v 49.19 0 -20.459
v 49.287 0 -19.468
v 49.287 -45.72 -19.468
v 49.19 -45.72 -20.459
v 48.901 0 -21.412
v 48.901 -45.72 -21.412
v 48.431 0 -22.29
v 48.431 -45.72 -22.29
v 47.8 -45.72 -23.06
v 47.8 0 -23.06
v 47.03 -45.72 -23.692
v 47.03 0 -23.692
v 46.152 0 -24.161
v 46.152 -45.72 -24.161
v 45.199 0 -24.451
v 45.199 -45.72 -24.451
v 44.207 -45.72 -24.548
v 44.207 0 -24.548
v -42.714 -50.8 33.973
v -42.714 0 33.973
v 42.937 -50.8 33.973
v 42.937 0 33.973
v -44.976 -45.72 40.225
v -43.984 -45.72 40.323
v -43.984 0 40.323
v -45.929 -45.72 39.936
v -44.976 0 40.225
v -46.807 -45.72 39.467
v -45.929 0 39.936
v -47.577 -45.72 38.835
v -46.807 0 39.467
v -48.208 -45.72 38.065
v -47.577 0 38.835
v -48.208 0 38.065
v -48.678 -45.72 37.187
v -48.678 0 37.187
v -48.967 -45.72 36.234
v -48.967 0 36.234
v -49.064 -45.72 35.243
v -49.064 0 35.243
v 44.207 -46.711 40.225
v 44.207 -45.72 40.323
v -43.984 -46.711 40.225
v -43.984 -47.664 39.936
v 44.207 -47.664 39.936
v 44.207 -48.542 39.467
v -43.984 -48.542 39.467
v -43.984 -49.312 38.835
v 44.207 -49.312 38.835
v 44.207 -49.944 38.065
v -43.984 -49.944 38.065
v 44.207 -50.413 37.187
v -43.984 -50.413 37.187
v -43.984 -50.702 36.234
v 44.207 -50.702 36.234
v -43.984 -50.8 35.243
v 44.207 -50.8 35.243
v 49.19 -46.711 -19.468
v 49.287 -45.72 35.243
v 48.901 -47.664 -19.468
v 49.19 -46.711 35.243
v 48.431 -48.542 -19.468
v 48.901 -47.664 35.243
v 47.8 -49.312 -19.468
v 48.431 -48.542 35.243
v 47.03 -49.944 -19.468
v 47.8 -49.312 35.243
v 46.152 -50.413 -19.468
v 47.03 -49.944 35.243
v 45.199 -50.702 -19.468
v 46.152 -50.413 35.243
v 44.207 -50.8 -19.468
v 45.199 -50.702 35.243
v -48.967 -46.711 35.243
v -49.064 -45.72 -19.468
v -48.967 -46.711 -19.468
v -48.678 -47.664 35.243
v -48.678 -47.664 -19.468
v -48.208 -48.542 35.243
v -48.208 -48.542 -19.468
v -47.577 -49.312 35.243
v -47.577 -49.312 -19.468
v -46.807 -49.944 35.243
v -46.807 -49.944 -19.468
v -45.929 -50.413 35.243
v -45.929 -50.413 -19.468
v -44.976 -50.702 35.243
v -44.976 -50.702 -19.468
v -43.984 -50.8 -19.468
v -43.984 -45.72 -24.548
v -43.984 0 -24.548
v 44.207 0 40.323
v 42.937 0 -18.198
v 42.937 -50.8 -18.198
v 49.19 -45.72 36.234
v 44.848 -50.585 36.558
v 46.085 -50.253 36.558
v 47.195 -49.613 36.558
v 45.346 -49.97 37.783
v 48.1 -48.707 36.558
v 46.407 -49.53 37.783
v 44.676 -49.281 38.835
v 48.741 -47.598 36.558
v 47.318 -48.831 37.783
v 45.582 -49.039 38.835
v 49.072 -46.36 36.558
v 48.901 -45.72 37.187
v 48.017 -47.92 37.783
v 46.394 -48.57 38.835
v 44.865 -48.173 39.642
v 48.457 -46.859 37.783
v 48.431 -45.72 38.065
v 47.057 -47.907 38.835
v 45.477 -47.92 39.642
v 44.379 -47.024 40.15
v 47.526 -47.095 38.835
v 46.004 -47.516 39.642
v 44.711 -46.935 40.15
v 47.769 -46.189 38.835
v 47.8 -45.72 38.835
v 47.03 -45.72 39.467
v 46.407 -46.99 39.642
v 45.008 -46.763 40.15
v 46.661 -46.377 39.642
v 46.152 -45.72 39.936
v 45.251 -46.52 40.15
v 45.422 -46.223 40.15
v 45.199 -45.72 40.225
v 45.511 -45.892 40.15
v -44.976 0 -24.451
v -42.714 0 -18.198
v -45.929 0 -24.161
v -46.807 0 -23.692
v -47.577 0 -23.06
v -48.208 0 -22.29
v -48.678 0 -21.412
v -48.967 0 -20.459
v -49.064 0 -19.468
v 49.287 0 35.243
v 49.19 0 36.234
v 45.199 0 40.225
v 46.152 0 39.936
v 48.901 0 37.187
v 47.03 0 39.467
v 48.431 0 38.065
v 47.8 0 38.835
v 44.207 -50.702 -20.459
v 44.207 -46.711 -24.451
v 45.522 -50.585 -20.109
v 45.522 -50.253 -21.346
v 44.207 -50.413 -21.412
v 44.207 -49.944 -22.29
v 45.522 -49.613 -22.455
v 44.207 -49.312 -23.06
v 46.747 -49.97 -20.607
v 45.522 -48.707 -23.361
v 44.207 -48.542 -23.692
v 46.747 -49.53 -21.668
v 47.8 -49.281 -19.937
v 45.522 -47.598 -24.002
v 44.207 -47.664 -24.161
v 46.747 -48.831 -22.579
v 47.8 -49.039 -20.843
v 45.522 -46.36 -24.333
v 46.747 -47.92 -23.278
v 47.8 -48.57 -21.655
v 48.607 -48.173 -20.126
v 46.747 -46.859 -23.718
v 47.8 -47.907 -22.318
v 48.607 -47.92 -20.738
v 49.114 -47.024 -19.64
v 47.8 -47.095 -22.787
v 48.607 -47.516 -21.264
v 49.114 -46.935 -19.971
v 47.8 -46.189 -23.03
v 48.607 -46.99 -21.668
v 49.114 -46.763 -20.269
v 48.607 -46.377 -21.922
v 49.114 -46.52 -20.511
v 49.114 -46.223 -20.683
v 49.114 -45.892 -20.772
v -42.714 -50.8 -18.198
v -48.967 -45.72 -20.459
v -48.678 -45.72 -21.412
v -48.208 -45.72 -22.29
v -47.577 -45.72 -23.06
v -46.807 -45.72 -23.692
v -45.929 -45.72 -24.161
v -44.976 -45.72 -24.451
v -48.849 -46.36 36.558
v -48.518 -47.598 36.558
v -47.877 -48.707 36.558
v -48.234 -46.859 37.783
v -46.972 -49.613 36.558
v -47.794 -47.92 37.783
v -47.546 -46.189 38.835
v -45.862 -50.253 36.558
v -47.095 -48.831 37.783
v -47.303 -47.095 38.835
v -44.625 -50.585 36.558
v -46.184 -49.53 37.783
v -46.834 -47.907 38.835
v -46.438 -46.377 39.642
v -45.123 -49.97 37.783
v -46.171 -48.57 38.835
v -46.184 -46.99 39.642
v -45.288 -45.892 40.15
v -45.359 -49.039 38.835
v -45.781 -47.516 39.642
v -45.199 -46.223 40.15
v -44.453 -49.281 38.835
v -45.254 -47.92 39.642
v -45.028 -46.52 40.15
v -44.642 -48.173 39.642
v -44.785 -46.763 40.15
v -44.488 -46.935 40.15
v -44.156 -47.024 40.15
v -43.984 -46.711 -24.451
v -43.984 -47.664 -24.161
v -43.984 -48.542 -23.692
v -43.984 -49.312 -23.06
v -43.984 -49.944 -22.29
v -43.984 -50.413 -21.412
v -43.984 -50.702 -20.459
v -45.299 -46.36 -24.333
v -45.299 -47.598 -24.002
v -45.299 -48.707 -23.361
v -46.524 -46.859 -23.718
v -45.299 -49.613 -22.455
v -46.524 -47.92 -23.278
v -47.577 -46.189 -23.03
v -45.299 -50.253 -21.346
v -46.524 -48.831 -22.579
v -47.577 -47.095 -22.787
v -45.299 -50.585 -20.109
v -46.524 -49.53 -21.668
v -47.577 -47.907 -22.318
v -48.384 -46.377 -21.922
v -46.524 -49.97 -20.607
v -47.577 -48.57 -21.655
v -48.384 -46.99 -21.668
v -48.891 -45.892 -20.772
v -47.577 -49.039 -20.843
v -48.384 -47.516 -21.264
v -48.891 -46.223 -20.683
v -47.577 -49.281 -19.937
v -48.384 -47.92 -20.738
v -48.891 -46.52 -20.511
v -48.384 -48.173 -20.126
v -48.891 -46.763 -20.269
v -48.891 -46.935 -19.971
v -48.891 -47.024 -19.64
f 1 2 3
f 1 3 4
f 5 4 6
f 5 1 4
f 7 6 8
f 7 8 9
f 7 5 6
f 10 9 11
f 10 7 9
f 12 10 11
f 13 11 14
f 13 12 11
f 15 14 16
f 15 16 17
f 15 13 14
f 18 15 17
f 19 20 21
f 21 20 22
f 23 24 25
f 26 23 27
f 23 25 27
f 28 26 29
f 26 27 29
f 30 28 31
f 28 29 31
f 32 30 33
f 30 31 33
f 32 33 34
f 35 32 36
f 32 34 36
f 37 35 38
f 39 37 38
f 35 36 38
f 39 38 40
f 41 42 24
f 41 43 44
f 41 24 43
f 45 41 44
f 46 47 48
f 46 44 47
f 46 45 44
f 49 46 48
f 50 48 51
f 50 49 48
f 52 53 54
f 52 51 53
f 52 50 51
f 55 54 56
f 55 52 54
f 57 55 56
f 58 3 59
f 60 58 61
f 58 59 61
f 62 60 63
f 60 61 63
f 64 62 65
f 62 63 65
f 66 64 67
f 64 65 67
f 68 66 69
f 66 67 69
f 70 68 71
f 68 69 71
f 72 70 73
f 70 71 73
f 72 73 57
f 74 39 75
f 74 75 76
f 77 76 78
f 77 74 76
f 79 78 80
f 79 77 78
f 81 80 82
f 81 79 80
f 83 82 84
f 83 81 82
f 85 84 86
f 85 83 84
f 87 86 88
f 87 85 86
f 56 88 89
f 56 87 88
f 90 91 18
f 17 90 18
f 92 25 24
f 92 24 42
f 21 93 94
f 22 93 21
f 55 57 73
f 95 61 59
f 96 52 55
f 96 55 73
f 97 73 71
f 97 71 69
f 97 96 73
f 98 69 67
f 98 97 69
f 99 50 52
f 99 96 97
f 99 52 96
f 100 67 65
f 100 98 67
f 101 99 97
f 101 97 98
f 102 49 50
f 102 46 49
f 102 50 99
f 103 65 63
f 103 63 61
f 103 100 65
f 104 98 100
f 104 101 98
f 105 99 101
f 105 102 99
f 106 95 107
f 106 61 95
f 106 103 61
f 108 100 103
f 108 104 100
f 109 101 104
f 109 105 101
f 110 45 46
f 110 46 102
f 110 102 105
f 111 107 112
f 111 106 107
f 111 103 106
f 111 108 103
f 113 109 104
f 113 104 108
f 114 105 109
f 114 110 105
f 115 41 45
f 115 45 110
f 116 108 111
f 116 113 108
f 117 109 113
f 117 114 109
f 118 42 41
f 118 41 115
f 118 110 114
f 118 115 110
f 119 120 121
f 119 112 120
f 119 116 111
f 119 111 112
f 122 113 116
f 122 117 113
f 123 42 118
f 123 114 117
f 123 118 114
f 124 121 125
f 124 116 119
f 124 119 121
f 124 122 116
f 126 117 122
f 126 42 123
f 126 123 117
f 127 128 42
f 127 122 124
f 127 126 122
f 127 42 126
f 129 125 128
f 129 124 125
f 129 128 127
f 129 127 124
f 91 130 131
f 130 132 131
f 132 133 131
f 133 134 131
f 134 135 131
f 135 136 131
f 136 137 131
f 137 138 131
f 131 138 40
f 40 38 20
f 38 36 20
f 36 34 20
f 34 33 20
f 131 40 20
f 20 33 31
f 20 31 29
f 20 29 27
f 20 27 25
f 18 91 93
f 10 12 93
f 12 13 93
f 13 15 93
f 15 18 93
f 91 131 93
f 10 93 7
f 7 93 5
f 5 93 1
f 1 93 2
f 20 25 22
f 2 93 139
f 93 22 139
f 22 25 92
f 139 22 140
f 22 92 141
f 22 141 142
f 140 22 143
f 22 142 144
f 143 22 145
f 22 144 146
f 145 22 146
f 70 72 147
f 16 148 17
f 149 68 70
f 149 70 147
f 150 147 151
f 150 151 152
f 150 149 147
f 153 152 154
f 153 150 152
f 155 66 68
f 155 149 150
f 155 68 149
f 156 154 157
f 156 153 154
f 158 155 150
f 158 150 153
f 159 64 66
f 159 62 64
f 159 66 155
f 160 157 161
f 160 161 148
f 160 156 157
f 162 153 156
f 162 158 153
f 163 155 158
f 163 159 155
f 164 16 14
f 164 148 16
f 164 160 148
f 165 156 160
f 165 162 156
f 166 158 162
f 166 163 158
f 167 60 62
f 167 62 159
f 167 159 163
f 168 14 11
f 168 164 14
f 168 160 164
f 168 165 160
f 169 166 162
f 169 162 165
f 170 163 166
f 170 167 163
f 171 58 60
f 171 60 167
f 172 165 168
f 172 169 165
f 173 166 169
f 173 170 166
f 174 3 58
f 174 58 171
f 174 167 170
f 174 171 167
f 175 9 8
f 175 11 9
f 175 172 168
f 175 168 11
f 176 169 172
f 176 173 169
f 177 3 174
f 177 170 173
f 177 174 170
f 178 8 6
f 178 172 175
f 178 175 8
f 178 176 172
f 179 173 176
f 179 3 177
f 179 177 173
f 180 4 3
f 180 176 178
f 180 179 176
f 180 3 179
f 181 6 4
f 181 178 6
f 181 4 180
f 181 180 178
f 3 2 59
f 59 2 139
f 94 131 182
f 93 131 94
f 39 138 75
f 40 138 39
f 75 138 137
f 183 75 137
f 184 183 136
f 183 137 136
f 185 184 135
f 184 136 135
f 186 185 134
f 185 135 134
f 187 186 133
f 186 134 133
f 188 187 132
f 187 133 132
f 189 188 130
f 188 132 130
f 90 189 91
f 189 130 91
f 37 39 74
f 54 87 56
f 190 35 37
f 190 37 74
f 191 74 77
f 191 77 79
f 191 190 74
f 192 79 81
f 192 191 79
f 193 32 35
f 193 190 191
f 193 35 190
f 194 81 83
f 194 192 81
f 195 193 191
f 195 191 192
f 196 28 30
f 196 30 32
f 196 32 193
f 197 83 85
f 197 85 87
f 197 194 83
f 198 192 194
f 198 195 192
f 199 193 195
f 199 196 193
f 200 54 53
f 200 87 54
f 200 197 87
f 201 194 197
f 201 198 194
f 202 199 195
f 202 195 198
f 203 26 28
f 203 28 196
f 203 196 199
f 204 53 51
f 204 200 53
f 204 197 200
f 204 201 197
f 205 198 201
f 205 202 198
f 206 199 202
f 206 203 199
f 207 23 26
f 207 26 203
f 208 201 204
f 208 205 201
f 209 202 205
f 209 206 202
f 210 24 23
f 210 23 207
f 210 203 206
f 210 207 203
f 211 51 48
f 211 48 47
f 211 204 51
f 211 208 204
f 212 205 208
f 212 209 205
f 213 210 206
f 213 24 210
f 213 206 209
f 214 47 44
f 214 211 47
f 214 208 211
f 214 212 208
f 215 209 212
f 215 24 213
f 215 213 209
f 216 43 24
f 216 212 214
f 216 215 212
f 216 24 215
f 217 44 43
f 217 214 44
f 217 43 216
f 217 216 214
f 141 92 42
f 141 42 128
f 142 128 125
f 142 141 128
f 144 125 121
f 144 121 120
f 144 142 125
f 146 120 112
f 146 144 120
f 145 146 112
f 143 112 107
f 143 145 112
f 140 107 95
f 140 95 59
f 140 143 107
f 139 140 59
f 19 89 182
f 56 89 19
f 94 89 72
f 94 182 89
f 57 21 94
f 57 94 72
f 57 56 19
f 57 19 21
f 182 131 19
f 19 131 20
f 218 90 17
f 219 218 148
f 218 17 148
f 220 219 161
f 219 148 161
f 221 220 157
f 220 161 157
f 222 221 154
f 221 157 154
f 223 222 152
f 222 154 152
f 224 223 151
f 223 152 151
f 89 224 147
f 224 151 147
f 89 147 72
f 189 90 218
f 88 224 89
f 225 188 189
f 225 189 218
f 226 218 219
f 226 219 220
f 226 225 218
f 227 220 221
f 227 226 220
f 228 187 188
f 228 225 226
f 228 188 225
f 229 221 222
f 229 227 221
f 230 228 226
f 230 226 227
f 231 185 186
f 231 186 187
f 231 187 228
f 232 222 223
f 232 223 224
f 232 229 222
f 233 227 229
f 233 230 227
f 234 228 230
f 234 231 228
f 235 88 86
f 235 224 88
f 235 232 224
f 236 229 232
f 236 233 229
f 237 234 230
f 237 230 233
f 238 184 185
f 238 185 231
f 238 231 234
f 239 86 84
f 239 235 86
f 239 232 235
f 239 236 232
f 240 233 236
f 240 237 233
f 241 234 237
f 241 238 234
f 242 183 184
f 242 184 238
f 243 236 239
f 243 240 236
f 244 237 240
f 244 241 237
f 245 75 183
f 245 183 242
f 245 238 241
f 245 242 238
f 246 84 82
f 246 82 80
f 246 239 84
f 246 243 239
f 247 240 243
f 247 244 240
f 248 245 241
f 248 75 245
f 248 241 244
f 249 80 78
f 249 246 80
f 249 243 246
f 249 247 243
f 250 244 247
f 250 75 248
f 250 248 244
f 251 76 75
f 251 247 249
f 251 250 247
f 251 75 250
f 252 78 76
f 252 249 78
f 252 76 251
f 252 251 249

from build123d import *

# Parameters (mm, degrees)
F1_W         = 98.3519479632
F1_H         = 64.8710429668
F1_W_2       = 85.651949048
F1_H_2       = 52.1710440516
F2_DEPTH     = 50.8
F3_R         = 5.08
F4_T1_DEPTH  = 58.42
F4_S5_W      = 5.08
F4_S5_H      = 5.08
F4_T6_DEPTH  = 5.08
F4_S11_W     = 5.08
F4_S11_H     = 5.08
F4_T12_DEPTH = 5.08
F4_S17_W     = 5.08
F4_S17_H     = 5.08
F4_T18_DEPTH = 5.08
F5_T1_DEPTH  = 58.42
F5_S5_W      = 5.08
F5_S5_H      = 5.08
F5_T6_DEPTH  = 5.08


# Not quite as in the source:
# - a fillet or chamfer that OpenCascade refuses, or shapes differently, is made with other operations: its cross-section is extruded or revolved along the edge and cut away or added


with BuildPart() as f2:
    # F1 (on face) → F2 (new body)
    with BuildSketch(Plane.XZ):
        with Locations((0.1114979386, 7.887352258)):
            Rectangle(F1_W, F1_H)
        with Locations((0.1114979386, 7.887352258)):
            Rectangle(F1_W_2, F1_H_2, mode=Mode.SUBTRACT)
    extrude(amount=F2_DEPTH)

    # F3
    f3_edges = [f2.edges().sort_by_distance(p)[0] for p in [
        (0.111498, -50.8, 40.322874),
        (49.287472, -50.8, 7.887352),
        (0.111498, -50.8, -24.548169),
        (-49.064476, -50.8, 7.887352),
    ]]
    fillet(f3_edges, radius=F3_R)

    # F4: fillet of radius 5.08 on 3 edges, made by hand

    # F4_s2 → F4_t1 (cut)
    with BuildSketch(Plane.XZ.offset(-12.7)):
        with BuildLine():
            ThreePointArc((44.2074719203, 40.3228737414), (47.7995743687, 38.8349761898), (49.2874719203, 35.2428737414))
            Line((49.2874719203, 35.2428737414), (49.2874719203, 40.3228737414))
            Line((49.2874719203, 40.3228737414), (44.2074719203, 40.3228737414))
        make_face()
        with BuildLine():
            ThreePointArc((49.2874719203, -19.4681692255), (47.7995743687, -23.0602716739), (44.2074719203, -24.5481692255))
            Line((44.2074719203, -24.5481692255), (49.2874719203, -24.5481692255))
            Line((49.2874719203, -24.5481692255), (49.2874719203, -19.4681692255))
        make_face()
        with BuildLine():
            ThreePointArc((-49.064476043, -19.4681692255), (-47.5765784914, -23.0602716739), (-43.984476043, -24.5481692255))
            Line((-43.984476043, -24.5481692255), (-49.064476043, -24.5481692255))
            Line((-49.064476043, -24.5481692255), (-49.064476043, -19.4681692255))
        make_face()
    extrude(amount=F4_T1_DEPTH, mode=Mode.SUBTRACT)


with BuildPart() as f4_tool4:
    # F4_s5 → F4_t6 (new body)
    with BuildSketch(Plane.YZ.offset(-43.984476043)):
        with Locations((-48.26, -22.0081692255)):
            Rectangle(F4_S5_W, F4_S5_H)
    extrude(amount=-F4_T6_DEPTH)

    # F4_s7 → F4_t8 (revolve, cut)
    with BuildSketch(Plane(origin=(-43.984476043, -45.72, -19.4681692255), x_dir=(0, 0.7071067812, 0.7071067812), z_dir=(0, -0.7071067812, 0.7071067812))):
        with BuildLine():
            ThreePointArc((0, -5.08), (5.08, 0), (0, 5.08))
            Line((0, 5.08), (0, -5.08))
        make_face()
    revolve(axis=Axis((-43.984476043, -45.72, -19.4681692255), (-1, 0, 0)), mode=Mode.SUBTRACT)


with BuildPart() as f2_1:
    add(f2.part)

    # F4_t3: cut F4_tool4
    add(f4_tool4.part, mode=Mode.SUBTRACT)


with BuildPart() as f4_tool10:
    # F4_s11 → F4_t12 (new body)
    with BuildSketch(Plane.YZ.offset(44.2074719203)):
        with Locations((-48.26, -22.0081692255)):
            Rectangle(F4_S11_W, F4_S11_H)
    extrude(amount=F4_T12_DEPTH)

    # F4_s13 → F4_t14 (revolve, cut)
    with BuildSketch(Plane(origin=(44.2074719203, -45.72, -19.4681692255), x_dir=(0, 0.7071067812, 0.7071067812), z_dir=(0, 0.7071067812, -0.7071067812))):
        with BuildLine():
            ThreePointArc((0, -5.08), (5.08, 0), (0, 5.08))
            Line((0, 5.08), (0, -5.08))
        make_face()
    revolve(axis=Axis((44.2074719203, -45.72, -19.4681692255), (1, 0, 0)), mode=Mode.SUBTRACT)


with BuildPart() as f2_2:
    add(f2_1.part)

    # F4_t9: cut F4_tool10
    add(f4_tool10.part, mode=Mode.SUBTRACT)


with BuildPart() as f4_tool16:
    # F4_s17 → F4_t18 (new body)
    with BuildSketch(Plane.XY.offset(35.2428737414)):
        with Locations((46.7474719203, -48.26)):
            Rectangle(F4_S17_W, F4_S17_H)
    extrude(amount=F4_T18_DEPTH)

    # F4_s19 → F4_t20 (revolve, cut)
    with BuildSketch(Plane(origin=(44.2074719203, -45.72, 35.2428737414), x_dir=(-0.7071067812, 0.7071067812, 0), z_dir=(0.7071067812, 0.7071067812, 0))):
        with BuildLine():
            ThreePointArc((0, -5.08), (5.08, 0), (0, 5.08))
            Line((0, 5.08), (0, -5.08))
        make_face()
    revolve(axis=Axis((44.2074719203, -45.72, 35.2428737414), (0, 0, 1)), mode=Mode.SUBTRACT)


with BuildPart() as f2_3:
    add(f2_2.part)

    # F4_t15: cut F4_tool16
    add(f4_tool16.part, mode=Mode.SUBTRACT)

    # F5: fillet of radius 5.08 on 1 edges, made by hand

    # F5_s2 → F5_t1 (cut)
    with BuildSketch(Plane.XZ.offset(-12.7)):
        with BuildLine():
            ThreePointArc((-43.984476043, 40.3228737414), (-47.5765784914, 38.8349761898), (-49.064476043, 35.2428737414))
            Line((-49.064476043, 35.2428737414), (-49.064476043, 40.3228737414))
            Line((-49.064476043, 40.3228737414), (-43.984476043, 40.3228737414))
        make_face()
    extrude(amount=F5_T1_DEPTH, mode=Mode.SUBTRACT)


with BuildPart() as f5_tool4:
    # F5_s5 → F5_t6 (new body)
    with BuildSketch(Plane.XY.offset(35.2428737414)):
        with Locations((-46.524476043, -48.26)):
            Rectangle(F5_S5_W, F5_S5_H)
    extrude(amount=F5_T6_DEPTH)

    # F5_s7 → F5_t8 (revolve, cut)
    with BuildSketch(Plane(origin=(-43.984476043, -45.72, 35.2428737414), x_dir=(0.7071067812, 0.7071067812, 0), z_dir=(0.7071067812, -0.7071067812, 0))):
        with BuildLine():
            ThreePointArc((0, -5.08), (5.08, 0), (0, 5.08))
            Line((0, 5.08), (0, -5.08))
        make_face()
    revolve(axis=Axis((-43.984476043, -45.72, 35.2428737414), (0, 0, 1)), mode=Mode.SUBTRACT)


with BuildPart() as f2_4:
    add(f2_3.part)

    # F5_t3: cut F5_tool4
    add(f5_tool4.part, mode=Mode.SUBTRACT)


solid = f2_4.part
